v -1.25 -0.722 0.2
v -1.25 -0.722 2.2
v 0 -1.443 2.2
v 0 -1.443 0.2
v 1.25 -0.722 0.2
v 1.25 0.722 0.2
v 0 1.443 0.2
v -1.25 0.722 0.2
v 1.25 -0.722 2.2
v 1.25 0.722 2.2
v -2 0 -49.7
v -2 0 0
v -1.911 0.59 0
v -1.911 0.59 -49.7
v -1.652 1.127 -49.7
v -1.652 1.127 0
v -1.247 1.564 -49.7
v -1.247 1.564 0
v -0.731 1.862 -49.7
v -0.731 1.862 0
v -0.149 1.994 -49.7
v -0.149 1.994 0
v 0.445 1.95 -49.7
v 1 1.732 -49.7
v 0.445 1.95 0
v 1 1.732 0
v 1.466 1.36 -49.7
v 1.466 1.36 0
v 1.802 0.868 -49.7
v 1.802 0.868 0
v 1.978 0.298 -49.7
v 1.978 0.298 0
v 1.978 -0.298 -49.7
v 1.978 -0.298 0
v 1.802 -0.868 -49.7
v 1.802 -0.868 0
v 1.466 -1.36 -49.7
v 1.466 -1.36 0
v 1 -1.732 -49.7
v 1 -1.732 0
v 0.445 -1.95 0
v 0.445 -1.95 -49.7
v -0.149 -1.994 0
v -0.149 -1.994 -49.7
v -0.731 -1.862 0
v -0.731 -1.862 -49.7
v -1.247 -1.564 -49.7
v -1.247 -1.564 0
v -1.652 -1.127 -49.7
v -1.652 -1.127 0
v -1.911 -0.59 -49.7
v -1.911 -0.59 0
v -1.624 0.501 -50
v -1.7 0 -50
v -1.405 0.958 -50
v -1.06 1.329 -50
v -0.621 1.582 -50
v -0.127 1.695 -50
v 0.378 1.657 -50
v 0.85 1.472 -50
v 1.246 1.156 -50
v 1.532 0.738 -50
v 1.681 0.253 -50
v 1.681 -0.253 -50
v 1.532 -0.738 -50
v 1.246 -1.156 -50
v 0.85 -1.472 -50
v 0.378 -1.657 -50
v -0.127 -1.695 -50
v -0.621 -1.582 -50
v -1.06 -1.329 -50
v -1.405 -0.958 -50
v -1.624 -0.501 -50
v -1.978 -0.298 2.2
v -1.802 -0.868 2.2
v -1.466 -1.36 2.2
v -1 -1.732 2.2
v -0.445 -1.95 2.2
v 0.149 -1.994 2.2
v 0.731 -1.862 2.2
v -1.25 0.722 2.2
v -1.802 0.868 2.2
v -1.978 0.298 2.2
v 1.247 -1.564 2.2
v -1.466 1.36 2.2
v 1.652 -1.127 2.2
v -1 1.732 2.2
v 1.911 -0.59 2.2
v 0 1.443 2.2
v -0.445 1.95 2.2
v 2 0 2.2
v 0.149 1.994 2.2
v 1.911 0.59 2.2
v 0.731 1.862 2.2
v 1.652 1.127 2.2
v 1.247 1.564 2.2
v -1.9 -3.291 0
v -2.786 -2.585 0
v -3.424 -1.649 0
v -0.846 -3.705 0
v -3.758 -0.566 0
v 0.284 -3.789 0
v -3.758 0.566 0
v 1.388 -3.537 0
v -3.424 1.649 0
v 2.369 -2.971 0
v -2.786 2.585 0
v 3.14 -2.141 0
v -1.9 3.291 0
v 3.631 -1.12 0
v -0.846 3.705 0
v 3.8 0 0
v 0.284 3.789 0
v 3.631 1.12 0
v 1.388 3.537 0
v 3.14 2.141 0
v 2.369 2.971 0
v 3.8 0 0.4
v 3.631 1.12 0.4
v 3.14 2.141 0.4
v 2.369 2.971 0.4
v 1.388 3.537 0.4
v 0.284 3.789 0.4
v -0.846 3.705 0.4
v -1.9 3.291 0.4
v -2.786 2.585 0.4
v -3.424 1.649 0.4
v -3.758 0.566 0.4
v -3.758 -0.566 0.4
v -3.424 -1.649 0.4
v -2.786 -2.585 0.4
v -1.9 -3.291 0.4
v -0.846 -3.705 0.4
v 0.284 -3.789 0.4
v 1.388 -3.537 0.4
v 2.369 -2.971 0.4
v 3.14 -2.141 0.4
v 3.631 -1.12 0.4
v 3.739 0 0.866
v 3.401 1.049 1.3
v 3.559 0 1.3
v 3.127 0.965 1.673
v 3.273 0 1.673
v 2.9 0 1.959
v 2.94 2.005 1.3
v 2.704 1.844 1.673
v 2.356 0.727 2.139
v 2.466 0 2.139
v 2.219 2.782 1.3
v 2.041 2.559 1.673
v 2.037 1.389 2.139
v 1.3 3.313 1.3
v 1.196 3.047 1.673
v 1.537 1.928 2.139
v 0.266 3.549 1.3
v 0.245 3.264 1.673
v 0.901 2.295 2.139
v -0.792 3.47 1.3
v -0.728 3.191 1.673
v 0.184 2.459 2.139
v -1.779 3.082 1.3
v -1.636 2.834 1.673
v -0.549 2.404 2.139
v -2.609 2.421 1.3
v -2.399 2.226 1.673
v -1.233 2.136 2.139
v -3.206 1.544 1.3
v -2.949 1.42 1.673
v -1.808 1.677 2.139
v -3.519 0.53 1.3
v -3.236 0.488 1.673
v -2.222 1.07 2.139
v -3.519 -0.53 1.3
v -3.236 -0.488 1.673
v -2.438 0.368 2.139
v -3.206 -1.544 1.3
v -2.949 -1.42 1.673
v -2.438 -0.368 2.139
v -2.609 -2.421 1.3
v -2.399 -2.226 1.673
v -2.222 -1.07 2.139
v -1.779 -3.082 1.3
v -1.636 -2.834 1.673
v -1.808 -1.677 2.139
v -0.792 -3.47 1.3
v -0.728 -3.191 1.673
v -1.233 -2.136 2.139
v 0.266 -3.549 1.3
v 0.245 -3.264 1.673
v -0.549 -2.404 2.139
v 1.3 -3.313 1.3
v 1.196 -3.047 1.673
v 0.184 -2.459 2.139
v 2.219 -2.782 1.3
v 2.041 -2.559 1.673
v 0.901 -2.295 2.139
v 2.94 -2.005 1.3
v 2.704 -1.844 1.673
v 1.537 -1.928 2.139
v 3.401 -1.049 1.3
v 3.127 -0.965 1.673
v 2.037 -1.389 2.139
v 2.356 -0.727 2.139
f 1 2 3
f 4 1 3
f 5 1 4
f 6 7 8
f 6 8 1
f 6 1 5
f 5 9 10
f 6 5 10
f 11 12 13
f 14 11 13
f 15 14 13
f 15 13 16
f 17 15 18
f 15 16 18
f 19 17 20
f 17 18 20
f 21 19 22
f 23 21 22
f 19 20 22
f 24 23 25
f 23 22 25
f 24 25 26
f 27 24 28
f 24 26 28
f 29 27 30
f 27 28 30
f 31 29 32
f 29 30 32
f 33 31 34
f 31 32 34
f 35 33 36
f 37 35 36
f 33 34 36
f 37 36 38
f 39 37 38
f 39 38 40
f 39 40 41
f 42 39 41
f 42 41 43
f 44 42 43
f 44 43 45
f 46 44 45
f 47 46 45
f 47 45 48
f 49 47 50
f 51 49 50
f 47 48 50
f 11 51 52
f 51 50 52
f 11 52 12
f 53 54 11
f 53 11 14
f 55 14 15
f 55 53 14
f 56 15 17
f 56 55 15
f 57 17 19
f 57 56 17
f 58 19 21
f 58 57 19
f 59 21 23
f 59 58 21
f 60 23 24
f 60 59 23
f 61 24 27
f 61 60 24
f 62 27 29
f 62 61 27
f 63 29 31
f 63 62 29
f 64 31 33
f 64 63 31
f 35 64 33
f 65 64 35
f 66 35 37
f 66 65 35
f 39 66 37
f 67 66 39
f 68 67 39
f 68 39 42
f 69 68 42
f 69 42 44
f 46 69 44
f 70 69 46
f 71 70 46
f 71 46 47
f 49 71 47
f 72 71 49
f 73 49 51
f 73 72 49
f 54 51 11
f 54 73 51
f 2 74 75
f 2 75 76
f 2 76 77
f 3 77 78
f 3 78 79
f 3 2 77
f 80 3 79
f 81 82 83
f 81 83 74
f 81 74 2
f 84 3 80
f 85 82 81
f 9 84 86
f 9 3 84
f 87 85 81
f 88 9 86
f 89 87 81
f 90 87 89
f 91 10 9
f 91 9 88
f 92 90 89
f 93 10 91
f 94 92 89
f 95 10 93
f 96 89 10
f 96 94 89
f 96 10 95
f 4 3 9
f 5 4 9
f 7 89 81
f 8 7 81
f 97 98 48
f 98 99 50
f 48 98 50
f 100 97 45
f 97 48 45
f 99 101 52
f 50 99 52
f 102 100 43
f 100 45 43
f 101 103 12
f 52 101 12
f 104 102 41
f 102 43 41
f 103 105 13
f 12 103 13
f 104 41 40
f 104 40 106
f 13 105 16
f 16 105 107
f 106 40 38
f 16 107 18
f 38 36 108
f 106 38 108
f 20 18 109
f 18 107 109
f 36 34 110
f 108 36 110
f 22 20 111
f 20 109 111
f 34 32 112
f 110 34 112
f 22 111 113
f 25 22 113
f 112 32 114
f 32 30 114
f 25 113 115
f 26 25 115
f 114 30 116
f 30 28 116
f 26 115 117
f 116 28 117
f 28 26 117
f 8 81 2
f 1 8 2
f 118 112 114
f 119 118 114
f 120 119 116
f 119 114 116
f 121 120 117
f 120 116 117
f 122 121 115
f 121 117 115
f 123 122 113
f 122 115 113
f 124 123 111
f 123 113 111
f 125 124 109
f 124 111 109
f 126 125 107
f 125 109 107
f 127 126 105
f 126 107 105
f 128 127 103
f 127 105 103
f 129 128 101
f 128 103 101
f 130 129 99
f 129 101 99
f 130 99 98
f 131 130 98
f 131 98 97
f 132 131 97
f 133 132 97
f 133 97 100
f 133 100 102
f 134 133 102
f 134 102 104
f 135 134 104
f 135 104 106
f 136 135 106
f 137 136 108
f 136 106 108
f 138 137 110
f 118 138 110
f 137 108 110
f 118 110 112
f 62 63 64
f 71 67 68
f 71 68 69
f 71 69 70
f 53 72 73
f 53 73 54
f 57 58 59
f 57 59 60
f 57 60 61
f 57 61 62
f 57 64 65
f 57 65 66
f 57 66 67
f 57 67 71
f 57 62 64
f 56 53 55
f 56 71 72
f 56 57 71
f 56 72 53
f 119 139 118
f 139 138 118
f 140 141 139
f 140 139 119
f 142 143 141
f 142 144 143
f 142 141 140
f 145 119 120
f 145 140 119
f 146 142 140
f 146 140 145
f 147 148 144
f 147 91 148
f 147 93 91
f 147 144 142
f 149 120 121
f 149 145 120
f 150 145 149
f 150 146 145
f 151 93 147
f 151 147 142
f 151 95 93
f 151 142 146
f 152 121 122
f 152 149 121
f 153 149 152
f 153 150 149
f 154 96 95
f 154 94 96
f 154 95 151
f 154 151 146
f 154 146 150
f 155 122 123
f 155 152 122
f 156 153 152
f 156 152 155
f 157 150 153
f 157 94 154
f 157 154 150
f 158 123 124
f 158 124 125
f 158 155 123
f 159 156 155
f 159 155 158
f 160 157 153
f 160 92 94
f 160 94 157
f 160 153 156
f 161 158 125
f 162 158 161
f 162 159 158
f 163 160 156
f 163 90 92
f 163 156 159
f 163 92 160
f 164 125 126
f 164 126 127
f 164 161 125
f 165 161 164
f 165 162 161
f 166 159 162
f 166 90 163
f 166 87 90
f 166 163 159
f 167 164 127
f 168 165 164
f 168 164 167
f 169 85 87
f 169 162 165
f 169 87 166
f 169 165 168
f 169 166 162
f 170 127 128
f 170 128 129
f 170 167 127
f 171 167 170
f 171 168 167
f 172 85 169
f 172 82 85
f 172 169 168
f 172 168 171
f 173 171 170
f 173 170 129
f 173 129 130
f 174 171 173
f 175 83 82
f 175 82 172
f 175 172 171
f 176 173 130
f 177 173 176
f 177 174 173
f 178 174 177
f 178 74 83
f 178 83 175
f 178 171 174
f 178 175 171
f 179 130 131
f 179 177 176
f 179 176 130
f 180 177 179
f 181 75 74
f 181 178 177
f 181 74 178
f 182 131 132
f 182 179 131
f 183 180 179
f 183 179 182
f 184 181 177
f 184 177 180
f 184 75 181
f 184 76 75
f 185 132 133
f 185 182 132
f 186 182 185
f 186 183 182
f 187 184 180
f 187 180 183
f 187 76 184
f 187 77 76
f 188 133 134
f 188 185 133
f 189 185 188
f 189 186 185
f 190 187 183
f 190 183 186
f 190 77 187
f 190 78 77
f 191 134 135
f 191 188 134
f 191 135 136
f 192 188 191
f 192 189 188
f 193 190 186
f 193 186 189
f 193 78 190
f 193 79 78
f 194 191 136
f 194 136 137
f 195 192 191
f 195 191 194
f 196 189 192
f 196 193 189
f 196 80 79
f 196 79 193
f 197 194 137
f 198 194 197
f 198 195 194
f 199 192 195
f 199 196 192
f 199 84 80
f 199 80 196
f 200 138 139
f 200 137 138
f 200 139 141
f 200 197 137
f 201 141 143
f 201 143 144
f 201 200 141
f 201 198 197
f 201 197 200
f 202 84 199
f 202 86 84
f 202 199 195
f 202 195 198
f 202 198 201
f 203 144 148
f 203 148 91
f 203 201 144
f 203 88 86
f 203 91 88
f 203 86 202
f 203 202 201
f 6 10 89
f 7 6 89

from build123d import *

# Parameters (mm, degrees)
SKETCH1_R           = 3.8
BOSS_EXTRUDE1_DEPTH = 2.2
SKETCH2_R           = 2
BOSS_EXTRUDE2_DEPTH = 50
CHAMFER1_SIZE       = 0.3
CUT_EXTRUDE1_DEPTH  = 2
FILLET1_R           = 1.8


with BuildPart() as part:
    # Sketch1 → Boss-Extrude1 (new body)
    with BuildSketch(Plane.XY):
        Circle(SKETCH1_R)
    extrude(amount=BOSS_EXTRUDE1_DEPTH)

    # Sketch2 → Boss-Extrude2 (add)
    with BuildSketch(Plane(origin=(0, 0, 0), x_dir=(-1, 0, 0), z_dir=(0, 0, -1))):
        Circle(SKETCH2_R)
    extrude(amount=BOSS_EXTRUDE2_DEPTH)

    # Chamfer1
    chamfer1_edges = [part.edges().sort_by_distance(p)[0] for p in [
        (2, 0, -50),
    ]]
    chamfer(chamfer1_edges, length=CHAMFER1_SIZE)

    # Sketch3 → Cut-Extrude1 (cut)
    with BuildSketch(Plane.XY.offset(2.2)):
        Polygon((0, 1.443375673), (-1.25, 0.721687836), (-1.25, -0.721687836), (0, -1.443375673), (1.25, -0.721687836), (1.25, 0.721687836), align=None)
    extrude(amount=-CUT_EXTRUDE1_DEPTH, mode=Mode.SUBTRACT)

    # Fillet1
    fillet1_edges = [part.edges().sort_by_distance(p)[0] for p in [
        (-3.8, 0, 2.2),
    ]]
    fillet(fillet1_edges, radius=FILLET1_R)


solid = part.part
